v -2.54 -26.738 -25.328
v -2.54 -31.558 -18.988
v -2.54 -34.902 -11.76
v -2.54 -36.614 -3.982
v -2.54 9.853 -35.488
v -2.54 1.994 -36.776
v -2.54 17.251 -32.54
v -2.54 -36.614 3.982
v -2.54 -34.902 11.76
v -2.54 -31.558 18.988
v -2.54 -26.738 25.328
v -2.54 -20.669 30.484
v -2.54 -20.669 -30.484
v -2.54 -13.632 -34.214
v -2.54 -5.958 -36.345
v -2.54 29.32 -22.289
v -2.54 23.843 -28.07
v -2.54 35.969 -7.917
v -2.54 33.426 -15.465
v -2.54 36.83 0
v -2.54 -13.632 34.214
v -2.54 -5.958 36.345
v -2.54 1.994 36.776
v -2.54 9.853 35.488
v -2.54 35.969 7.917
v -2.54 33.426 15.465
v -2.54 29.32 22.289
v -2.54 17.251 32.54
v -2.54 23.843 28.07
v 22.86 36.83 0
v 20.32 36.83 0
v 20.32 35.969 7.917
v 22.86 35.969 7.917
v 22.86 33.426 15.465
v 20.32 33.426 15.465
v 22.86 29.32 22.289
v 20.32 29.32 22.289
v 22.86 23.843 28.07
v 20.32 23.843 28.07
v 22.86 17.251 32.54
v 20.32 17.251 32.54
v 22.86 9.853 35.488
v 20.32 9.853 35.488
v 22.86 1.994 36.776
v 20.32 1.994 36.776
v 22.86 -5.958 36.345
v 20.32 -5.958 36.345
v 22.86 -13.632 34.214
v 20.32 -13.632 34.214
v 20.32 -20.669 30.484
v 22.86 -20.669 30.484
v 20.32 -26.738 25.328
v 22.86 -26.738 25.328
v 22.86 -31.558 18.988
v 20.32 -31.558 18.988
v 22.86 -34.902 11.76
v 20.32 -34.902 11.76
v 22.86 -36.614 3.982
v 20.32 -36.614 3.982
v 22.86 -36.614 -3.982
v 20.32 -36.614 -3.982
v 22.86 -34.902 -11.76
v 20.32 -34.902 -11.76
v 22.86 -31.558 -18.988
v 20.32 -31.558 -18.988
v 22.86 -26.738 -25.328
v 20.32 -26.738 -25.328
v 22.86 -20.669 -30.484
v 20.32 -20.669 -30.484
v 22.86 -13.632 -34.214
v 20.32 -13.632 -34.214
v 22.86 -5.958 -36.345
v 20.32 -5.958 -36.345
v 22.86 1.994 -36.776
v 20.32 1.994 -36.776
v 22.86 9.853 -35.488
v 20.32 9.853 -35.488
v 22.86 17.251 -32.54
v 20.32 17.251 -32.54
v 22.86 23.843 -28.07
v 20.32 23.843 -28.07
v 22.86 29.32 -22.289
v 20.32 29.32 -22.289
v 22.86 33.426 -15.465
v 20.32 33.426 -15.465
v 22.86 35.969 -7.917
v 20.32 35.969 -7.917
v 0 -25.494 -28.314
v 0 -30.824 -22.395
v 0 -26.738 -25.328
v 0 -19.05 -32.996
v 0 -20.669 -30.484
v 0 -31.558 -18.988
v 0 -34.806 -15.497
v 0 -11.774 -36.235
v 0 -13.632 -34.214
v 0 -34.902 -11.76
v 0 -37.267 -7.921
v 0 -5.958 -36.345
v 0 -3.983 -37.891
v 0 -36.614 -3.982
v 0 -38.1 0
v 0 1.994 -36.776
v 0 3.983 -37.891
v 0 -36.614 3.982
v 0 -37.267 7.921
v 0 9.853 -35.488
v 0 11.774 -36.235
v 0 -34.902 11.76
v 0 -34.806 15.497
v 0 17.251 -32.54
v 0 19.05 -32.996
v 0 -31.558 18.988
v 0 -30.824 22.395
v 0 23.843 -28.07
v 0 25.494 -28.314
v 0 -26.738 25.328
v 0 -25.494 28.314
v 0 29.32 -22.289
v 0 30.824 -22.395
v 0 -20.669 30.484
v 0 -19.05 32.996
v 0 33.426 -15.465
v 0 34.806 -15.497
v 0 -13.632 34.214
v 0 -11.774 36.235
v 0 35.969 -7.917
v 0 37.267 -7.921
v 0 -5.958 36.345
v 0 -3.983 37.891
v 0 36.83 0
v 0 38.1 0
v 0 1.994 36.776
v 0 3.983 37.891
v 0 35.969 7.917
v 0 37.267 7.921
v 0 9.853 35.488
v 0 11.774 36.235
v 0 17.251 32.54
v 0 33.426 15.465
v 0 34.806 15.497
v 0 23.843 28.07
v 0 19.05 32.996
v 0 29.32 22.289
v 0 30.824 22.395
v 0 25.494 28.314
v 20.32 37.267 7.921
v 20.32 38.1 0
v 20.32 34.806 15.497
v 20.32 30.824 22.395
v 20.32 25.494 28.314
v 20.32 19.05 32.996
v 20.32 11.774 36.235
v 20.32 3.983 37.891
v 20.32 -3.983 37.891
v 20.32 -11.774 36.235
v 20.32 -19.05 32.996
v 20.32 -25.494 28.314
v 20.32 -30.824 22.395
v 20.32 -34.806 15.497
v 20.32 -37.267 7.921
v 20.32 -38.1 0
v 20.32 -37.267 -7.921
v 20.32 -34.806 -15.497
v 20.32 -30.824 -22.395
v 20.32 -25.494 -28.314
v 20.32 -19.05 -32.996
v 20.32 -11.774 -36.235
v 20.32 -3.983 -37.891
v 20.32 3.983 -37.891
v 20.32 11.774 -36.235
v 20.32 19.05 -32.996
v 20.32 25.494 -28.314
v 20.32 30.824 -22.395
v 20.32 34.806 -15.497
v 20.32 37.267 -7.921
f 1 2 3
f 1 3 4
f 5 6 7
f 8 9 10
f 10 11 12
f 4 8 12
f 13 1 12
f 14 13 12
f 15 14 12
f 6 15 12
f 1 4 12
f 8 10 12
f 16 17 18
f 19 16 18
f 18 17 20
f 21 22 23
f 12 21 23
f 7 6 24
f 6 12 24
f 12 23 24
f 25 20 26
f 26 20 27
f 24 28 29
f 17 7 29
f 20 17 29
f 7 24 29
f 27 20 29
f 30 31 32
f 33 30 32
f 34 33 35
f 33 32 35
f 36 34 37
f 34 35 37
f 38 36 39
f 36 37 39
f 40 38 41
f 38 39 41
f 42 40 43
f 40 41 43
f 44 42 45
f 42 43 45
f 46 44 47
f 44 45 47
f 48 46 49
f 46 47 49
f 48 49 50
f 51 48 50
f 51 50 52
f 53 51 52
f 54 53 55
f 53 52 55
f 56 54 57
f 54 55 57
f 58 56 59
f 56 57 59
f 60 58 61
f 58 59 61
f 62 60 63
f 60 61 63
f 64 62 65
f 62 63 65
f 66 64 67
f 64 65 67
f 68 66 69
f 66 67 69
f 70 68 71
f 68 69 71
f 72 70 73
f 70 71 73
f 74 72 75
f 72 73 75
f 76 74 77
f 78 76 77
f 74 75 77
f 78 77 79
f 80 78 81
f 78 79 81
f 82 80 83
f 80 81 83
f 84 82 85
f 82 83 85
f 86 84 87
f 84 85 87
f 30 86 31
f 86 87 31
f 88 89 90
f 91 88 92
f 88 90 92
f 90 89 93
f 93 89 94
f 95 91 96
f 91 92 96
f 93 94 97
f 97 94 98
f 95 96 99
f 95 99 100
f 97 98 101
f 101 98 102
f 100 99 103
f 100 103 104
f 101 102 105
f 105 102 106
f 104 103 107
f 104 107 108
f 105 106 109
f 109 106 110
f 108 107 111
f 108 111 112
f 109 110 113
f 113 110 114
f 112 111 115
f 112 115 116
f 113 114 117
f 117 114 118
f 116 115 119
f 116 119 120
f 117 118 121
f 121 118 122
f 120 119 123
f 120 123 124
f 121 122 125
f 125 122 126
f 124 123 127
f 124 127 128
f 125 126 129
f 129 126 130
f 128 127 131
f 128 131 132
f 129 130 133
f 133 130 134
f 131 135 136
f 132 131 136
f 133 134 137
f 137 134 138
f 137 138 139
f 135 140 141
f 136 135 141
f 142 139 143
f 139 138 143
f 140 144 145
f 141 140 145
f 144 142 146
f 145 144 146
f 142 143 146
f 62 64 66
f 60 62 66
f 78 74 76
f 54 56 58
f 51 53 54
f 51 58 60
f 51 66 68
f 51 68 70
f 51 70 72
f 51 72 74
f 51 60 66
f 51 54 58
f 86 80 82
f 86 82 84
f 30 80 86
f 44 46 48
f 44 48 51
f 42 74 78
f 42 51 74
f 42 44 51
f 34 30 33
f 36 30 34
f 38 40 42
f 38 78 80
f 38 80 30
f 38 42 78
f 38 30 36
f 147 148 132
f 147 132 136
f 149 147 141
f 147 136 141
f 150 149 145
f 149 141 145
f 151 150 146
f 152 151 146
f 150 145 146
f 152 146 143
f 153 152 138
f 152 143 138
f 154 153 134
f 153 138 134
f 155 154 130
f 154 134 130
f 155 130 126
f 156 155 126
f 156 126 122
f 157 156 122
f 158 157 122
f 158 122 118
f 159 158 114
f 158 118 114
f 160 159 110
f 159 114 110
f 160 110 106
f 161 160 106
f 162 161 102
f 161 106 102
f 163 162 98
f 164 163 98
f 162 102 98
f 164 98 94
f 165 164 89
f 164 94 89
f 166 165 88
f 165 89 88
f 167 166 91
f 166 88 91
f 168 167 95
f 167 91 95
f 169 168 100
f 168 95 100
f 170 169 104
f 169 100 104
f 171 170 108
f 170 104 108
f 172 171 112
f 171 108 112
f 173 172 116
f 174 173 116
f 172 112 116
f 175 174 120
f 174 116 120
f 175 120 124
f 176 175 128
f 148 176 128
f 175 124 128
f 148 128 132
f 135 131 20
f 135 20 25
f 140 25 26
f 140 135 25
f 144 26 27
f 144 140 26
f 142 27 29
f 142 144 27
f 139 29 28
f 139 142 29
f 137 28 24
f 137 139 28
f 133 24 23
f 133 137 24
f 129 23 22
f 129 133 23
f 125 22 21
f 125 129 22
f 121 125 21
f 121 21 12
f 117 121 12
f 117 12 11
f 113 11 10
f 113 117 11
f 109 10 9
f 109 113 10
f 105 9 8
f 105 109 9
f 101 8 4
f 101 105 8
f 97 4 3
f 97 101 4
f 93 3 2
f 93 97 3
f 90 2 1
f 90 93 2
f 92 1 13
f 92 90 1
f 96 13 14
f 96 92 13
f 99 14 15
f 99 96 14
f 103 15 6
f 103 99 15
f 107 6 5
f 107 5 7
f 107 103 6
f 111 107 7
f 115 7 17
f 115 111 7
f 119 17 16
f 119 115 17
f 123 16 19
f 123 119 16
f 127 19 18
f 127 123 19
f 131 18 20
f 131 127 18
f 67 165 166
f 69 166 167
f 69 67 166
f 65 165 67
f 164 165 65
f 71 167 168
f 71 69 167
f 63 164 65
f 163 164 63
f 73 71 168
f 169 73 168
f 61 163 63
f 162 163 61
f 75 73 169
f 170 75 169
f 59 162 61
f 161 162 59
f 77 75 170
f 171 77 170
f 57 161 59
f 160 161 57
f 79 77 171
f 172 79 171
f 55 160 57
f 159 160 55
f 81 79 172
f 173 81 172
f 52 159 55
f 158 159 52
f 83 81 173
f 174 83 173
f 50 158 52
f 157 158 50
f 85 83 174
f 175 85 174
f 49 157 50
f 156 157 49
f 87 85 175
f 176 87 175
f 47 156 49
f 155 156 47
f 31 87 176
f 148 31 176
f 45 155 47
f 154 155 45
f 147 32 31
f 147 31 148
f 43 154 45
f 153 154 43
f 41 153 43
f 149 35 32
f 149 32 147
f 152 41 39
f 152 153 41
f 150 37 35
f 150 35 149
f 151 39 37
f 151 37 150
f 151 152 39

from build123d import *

# Parameters (mm, degrees)
F0_R     = 36.83
F1_DEPTH = 2.54
F2_R     = 38.1
F2_R_2   = 36.83
F3_DEPTH = 20.32
F4_R     = 36.83
F5_DEPTH = 2.54


with BuildPart() as f1:
    # F0 (on Right) → F1 (new body)
    with BuildSketch(Plane.YZ):
        Circle(F0_R)
    extrude(amount=-F1_DEPTH)

    # F2 (on face) → F3 (join)
    with BuildSketch(Plane.YZ):
        Circle(F2_R)
        Circle(F2_R_2, mode=Mode.SUBTRACT)
        Circle(F2_R_2)
    extrude(amount=F3_DEPTH)

    # F4 (on face) → F5 (join)
    with BuildSketch(Plane.YZ.offset(20.32)):
        Circle(F4_R)
    extrude(amount=F5_DEPTH)


solid = f1.part
